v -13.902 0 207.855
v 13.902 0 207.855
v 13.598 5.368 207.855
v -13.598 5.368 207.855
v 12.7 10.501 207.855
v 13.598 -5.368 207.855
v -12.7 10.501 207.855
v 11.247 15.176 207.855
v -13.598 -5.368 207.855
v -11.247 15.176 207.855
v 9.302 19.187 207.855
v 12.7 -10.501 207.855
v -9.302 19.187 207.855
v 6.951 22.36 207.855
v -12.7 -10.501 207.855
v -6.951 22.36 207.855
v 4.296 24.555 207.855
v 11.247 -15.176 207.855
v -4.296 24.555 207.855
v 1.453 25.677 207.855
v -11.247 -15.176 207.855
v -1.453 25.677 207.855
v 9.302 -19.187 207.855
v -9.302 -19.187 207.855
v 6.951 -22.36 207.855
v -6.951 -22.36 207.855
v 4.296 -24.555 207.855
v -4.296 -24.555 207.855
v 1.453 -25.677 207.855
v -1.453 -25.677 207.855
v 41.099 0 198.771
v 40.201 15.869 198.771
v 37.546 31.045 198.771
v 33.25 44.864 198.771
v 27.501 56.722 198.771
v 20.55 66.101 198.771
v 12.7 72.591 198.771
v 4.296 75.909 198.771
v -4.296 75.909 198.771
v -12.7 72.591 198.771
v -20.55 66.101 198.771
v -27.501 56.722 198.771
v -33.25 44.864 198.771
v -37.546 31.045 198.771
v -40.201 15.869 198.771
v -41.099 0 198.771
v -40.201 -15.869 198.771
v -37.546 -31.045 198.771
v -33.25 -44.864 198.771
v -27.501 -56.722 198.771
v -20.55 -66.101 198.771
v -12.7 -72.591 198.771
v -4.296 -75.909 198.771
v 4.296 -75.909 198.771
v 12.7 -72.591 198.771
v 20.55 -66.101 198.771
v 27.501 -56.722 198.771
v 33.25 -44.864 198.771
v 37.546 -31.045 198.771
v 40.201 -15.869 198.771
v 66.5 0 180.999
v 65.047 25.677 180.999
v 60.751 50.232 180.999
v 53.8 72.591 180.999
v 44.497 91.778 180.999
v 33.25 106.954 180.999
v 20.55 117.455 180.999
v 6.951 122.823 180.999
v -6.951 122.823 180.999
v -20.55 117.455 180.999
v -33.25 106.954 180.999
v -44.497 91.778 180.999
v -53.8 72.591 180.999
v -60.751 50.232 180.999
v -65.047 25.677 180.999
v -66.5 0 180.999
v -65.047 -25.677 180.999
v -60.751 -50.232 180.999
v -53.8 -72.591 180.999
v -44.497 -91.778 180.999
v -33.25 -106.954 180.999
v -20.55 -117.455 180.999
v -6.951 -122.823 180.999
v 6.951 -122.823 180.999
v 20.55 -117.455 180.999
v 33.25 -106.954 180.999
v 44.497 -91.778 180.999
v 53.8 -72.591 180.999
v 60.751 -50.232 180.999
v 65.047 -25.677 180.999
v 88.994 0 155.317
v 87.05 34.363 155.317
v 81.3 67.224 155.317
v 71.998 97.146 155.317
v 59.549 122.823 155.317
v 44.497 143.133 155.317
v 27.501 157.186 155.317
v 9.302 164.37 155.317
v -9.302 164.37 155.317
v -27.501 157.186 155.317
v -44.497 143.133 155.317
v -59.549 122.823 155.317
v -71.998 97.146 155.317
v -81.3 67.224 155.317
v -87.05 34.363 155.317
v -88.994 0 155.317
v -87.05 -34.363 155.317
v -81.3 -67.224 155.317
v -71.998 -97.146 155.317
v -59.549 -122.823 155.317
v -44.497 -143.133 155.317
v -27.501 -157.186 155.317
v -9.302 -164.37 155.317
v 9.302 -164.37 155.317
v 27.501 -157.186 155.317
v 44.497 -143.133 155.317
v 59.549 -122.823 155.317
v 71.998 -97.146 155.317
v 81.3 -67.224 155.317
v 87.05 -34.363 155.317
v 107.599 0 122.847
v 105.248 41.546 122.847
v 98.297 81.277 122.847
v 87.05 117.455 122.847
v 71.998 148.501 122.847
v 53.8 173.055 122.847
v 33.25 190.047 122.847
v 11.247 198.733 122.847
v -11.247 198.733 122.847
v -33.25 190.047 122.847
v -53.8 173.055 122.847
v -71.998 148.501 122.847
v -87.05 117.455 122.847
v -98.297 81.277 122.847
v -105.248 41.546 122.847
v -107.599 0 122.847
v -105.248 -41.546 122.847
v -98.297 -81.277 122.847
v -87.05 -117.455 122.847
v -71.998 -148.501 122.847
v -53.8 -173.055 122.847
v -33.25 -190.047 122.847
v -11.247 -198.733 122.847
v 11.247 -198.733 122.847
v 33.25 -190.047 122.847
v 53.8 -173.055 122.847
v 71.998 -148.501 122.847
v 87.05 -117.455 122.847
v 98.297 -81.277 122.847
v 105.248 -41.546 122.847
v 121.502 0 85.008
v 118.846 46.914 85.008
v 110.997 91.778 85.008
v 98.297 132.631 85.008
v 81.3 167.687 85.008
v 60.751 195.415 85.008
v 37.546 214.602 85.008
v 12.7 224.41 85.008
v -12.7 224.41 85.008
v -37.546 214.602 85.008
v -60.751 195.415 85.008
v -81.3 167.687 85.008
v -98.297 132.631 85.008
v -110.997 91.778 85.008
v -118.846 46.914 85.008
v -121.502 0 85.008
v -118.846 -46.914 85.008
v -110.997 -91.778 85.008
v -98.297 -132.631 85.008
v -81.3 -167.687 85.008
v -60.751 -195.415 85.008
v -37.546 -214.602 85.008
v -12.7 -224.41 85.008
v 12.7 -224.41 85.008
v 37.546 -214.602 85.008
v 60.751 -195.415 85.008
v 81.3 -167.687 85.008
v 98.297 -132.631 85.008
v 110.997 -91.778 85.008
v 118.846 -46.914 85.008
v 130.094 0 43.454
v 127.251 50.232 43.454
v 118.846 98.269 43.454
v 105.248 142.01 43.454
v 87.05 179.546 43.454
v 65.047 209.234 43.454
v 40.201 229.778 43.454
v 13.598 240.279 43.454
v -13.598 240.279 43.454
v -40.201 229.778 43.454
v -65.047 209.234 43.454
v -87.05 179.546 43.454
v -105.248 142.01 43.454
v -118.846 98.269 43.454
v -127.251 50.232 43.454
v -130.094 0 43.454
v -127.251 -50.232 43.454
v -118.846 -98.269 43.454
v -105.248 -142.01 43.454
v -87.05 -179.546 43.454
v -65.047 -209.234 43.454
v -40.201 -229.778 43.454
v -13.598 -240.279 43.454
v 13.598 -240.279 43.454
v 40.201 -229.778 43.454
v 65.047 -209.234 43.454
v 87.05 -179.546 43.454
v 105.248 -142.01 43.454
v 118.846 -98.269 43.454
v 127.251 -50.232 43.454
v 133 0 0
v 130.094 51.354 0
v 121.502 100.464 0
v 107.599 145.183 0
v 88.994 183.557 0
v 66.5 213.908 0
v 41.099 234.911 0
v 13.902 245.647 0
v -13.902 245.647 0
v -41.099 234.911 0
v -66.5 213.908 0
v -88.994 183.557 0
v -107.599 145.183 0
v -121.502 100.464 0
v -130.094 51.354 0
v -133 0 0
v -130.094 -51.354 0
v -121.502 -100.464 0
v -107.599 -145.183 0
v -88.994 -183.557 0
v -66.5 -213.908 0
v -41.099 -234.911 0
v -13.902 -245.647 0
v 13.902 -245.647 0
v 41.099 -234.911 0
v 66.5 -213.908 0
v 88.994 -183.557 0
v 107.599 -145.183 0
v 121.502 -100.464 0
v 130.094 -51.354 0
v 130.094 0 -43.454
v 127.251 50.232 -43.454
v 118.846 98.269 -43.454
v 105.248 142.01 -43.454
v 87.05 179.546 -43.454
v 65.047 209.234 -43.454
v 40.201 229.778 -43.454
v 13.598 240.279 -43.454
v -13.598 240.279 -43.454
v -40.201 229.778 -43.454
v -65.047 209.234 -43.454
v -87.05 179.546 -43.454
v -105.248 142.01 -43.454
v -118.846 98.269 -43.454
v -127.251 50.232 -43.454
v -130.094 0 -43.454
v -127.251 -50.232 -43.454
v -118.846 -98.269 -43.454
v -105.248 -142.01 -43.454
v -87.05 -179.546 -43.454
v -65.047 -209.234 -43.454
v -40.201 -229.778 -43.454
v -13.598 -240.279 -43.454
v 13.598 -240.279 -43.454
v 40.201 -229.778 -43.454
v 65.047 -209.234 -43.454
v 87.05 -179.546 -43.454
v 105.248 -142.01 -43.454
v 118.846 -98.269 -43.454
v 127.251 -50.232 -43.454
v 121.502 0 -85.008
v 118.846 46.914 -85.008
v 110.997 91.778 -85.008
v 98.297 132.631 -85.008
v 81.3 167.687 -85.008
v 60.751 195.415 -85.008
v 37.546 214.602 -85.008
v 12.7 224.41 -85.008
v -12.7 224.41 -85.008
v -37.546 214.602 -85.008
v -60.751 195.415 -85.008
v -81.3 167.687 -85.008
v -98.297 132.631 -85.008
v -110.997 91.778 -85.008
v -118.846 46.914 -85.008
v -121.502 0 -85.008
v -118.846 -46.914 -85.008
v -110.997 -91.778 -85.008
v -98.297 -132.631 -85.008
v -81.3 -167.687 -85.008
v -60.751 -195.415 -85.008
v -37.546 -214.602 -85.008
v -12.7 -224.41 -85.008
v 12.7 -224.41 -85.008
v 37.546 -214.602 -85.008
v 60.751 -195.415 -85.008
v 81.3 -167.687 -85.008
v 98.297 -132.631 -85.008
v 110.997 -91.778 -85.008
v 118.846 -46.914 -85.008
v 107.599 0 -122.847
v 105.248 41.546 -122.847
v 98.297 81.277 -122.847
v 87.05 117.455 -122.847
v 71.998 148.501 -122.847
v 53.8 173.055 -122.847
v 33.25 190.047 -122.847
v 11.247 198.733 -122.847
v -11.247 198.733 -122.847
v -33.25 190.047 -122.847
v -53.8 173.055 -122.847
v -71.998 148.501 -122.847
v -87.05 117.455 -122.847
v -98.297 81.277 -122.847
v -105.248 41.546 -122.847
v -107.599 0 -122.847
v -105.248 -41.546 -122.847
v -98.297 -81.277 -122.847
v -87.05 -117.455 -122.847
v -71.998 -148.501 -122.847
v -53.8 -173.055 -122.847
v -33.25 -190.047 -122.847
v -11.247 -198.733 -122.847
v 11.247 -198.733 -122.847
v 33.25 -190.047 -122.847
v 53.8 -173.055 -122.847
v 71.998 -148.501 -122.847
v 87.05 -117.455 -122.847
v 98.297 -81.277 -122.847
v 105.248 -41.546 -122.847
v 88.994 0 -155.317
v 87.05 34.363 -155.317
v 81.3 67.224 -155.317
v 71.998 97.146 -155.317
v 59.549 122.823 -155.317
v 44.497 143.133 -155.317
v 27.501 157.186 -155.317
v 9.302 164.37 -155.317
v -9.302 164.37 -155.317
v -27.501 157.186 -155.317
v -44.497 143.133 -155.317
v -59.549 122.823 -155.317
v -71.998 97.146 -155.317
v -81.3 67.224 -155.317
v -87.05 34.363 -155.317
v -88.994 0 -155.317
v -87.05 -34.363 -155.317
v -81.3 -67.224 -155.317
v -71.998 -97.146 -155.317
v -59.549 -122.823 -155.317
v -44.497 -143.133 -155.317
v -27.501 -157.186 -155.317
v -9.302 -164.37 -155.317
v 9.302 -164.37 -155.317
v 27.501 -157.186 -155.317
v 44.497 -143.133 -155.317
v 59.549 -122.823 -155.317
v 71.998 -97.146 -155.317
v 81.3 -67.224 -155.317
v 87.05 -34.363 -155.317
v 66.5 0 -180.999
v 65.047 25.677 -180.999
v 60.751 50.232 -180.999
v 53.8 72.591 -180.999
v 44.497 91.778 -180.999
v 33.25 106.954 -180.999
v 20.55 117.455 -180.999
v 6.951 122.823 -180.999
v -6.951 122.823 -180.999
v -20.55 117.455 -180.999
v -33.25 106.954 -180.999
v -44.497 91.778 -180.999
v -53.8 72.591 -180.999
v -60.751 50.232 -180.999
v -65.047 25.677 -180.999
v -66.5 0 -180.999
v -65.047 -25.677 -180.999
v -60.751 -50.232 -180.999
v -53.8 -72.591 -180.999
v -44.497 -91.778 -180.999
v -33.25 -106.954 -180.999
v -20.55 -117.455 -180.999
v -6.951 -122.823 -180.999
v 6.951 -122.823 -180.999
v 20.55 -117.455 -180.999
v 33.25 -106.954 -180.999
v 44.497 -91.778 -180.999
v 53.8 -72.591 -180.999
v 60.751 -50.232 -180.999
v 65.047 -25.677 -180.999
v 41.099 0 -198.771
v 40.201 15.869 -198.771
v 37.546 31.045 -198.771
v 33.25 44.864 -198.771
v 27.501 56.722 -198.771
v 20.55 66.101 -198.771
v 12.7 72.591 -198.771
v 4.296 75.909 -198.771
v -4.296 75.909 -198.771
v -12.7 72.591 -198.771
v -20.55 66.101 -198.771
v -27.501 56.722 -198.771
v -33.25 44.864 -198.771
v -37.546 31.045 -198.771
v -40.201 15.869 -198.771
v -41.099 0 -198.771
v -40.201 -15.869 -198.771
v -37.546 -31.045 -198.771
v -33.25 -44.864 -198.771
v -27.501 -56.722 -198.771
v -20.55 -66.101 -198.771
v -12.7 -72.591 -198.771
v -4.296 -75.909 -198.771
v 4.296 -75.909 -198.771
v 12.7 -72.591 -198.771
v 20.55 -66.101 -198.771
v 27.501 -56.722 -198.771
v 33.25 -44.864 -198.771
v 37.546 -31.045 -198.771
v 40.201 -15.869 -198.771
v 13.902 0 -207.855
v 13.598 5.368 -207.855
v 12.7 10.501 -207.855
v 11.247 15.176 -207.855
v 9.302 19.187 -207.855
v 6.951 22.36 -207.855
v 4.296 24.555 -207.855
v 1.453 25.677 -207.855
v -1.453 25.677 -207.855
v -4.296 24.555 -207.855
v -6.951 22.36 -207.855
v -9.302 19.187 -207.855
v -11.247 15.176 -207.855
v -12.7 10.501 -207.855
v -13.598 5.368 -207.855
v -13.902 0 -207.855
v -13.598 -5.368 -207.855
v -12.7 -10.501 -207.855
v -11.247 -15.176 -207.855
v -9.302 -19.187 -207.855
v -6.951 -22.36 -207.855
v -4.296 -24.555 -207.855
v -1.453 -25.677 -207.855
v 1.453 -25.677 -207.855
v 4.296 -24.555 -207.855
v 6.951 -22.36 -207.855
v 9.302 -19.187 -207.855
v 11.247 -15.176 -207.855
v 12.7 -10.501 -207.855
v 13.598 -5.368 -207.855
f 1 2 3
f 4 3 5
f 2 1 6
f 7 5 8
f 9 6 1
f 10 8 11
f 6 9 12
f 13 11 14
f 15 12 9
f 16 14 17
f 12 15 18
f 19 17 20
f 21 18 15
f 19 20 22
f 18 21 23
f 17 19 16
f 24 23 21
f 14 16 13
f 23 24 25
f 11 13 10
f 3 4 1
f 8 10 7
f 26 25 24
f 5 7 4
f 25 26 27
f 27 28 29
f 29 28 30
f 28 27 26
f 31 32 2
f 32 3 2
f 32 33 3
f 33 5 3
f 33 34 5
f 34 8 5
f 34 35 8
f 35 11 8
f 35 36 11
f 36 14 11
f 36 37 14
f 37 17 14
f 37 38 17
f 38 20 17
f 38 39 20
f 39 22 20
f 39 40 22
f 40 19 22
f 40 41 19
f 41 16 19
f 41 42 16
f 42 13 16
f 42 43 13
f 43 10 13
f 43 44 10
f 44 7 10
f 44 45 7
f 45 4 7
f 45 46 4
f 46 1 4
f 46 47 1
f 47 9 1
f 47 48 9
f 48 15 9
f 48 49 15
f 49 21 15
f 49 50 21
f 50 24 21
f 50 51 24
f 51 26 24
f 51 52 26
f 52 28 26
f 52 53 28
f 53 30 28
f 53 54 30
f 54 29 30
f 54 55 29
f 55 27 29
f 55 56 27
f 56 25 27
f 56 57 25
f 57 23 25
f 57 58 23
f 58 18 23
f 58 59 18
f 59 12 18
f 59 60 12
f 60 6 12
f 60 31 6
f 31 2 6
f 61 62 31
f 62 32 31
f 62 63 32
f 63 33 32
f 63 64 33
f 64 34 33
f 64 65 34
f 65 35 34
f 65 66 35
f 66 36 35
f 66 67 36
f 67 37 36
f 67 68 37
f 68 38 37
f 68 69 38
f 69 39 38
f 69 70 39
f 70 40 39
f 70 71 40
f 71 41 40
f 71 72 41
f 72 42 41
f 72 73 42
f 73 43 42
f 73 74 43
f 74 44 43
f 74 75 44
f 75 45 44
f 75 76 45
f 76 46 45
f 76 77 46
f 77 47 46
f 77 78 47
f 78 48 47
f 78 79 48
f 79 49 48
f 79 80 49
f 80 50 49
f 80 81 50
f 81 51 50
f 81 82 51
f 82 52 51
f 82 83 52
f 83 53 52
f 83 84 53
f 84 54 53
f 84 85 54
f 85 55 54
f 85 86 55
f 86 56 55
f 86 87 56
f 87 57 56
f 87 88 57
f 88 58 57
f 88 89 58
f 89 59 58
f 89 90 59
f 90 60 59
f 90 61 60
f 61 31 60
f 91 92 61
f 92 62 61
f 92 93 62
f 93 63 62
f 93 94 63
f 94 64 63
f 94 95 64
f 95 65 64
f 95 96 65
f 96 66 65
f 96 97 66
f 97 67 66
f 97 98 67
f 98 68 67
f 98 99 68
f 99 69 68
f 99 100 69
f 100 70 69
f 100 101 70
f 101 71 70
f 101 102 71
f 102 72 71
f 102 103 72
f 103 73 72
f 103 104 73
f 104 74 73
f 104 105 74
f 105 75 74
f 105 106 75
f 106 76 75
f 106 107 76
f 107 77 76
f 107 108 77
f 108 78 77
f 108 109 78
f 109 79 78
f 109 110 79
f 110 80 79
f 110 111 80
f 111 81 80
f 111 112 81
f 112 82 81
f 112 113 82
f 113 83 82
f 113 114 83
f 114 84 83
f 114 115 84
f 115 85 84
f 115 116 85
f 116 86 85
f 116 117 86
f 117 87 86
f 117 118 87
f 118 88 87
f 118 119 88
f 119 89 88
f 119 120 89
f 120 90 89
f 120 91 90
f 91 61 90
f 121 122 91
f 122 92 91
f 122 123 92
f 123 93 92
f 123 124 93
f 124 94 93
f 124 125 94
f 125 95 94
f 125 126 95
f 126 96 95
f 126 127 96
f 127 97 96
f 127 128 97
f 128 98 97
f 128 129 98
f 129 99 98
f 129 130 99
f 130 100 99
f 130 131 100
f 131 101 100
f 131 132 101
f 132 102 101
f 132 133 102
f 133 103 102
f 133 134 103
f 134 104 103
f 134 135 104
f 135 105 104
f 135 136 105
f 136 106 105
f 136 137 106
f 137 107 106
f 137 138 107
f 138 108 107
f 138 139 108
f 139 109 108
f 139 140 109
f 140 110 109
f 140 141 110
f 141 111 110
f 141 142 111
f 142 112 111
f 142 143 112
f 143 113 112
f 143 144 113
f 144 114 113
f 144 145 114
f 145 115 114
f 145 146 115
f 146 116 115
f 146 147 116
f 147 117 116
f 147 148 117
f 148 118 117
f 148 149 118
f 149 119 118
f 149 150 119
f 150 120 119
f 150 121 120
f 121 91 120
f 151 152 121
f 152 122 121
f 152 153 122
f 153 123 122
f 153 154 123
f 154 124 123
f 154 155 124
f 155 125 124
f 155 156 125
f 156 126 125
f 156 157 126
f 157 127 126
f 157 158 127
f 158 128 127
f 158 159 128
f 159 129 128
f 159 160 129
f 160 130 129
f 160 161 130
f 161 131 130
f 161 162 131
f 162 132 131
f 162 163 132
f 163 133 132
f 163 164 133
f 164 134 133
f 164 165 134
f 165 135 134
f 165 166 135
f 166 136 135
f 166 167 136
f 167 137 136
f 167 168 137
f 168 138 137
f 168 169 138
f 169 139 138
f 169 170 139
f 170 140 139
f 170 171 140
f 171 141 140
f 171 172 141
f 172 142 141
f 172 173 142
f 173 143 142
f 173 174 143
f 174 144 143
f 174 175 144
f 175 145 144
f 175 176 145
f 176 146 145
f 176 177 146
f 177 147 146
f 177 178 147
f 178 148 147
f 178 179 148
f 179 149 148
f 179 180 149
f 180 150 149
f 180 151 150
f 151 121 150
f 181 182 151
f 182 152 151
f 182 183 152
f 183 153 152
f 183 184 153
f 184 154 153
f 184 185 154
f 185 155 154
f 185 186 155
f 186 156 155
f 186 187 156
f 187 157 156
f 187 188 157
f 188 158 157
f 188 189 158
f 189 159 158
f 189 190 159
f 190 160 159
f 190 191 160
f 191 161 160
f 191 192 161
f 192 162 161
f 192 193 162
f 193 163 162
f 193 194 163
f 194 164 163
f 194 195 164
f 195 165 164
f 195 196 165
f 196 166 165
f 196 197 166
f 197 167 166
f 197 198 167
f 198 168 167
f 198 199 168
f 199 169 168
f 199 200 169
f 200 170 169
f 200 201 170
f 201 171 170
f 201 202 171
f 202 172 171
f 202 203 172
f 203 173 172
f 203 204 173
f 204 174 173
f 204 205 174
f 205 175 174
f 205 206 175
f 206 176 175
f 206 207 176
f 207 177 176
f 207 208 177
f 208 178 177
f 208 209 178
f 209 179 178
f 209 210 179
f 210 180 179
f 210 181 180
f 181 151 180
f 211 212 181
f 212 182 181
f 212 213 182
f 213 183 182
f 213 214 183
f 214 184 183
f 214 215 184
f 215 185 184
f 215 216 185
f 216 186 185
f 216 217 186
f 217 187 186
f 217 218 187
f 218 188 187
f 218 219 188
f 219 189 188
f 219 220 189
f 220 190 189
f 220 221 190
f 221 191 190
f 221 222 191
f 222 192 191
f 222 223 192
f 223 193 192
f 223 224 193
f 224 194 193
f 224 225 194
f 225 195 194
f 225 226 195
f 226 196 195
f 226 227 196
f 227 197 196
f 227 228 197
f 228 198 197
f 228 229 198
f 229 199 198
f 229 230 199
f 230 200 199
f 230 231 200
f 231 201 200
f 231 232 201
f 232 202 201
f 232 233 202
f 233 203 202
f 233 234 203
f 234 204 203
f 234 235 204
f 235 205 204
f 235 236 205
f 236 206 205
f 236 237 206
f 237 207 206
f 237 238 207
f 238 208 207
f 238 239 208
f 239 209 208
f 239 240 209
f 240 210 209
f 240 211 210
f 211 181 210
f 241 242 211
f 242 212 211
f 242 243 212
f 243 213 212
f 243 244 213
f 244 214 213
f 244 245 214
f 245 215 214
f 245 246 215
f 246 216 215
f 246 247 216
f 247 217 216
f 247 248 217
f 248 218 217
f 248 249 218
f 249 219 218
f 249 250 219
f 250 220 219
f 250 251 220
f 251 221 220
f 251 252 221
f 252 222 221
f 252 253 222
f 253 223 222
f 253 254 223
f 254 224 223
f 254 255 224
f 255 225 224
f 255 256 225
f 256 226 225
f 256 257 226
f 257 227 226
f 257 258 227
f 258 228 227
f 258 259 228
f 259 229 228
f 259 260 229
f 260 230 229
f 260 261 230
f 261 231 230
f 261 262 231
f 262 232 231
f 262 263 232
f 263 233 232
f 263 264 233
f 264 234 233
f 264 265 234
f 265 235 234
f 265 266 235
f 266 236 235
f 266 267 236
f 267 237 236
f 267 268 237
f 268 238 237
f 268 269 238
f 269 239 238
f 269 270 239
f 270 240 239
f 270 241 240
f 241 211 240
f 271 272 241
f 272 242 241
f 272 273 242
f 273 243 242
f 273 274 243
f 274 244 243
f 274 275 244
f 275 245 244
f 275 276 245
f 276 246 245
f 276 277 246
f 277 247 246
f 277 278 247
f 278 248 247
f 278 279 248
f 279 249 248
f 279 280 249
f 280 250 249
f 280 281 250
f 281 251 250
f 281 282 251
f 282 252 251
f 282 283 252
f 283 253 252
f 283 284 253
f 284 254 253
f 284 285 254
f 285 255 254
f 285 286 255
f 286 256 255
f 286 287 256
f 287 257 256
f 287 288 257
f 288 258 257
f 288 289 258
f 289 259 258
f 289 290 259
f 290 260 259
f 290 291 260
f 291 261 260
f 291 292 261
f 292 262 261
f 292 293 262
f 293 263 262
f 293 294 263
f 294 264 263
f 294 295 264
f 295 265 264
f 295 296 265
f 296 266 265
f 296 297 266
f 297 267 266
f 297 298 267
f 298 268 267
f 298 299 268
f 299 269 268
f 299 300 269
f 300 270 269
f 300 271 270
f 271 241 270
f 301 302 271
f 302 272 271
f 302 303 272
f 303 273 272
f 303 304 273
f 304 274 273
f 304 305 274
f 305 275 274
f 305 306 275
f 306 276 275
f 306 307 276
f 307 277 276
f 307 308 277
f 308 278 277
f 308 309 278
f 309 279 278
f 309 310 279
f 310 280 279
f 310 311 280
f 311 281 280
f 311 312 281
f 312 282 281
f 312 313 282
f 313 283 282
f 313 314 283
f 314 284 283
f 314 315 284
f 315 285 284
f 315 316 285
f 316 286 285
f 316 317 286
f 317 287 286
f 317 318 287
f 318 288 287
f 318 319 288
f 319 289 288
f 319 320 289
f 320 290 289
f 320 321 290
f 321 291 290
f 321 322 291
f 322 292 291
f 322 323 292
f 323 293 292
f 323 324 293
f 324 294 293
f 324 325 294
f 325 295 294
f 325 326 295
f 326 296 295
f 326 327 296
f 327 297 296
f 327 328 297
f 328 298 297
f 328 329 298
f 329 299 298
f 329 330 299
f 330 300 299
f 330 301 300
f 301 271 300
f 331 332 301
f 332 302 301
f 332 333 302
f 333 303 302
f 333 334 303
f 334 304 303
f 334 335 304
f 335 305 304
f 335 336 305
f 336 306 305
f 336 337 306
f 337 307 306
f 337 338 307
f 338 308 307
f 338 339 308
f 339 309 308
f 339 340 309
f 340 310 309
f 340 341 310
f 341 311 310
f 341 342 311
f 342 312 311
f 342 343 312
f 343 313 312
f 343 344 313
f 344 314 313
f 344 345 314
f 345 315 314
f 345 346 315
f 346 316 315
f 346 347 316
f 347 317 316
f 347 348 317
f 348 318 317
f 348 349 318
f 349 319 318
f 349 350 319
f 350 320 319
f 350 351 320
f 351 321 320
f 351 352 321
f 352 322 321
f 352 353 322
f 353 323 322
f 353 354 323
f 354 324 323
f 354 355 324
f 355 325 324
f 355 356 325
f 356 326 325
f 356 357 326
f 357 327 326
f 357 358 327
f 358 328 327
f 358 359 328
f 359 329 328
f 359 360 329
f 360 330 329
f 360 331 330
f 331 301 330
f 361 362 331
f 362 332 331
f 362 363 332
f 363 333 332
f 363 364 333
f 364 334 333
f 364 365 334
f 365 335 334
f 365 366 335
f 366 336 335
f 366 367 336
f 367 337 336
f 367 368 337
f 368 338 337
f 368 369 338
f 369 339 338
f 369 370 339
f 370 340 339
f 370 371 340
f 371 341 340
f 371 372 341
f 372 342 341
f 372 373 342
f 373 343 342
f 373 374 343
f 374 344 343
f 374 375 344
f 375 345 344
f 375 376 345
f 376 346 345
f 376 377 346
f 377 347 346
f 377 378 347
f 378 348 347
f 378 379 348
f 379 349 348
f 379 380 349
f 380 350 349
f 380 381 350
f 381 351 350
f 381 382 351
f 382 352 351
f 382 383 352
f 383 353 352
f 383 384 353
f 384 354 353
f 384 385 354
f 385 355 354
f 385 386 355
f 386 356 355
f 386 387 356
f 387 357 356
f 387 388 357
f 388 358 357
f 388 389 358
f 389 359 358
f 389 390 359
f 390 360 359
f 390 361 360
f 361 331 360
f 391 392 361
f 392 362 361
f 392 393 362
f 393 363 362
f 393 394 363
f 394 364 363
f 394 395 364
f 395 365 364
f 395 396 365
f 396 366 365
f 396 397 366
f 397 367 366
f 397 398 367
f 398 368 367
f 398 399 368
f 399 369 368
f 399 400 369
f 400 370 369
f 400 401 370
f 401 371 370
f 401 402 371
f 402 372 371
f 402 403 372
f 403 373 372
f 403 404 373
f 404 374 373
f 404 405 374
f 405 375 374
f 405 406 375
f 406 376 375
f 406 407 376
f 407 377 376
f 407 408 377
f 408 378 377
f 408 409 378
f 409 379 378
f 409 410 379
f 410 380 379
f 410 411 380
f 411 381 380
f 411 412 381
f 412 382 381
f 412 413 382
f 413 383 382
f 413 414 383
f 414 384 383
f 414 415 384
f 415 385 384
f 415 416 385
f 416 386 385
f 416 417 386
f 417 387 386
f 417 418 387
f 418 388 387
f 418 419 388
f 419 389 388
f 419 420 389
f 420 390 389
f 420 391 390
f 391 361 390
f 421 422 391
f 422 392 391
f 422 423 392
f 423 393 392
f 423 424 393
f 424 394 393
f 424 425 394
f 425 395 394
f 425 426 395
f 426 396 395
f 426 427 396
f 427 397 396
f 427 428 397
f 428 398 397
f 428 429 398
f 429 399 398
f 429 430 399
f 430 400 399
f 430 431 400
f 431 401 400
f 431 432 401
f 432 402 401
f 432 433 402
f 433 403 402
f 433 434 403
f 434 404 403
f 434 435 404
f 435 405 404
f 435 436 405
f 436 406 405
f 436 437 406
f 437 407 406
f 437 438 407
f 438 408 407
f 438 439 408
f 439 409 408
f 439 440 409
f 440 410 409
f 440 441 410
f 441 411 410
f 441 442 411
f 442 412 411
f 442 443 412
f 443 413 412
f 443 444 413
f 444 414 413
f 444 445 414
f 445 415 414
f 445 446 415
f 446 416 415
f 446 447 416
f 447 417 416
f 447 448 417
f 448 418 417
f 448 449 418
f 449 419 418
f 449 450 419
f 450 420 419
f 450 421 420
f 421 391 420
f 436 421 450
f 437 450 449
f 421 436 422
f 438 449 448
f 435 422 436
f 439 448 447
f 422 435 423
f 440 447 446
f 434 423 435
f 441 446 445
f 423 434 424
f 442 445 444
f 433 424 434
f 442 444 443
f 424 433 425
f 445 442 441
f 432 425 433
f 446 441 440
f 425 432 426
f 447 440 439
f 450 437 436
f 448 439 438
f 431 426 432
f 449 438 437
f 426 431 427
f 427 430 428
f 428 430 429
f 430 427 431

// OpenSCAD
// Generated by SolidPython 1.0.1 on 2020-07-29 00:46:47


scale(v = [7, 13, 11]) {
	sphere(r = 19);
}
/***********************************************
*********      SolidPython code:      **********
************************************************
 
# import packages: SolidPython
from solid import *
from solid.utils import *
from itertools import chain, combinations, permutations


class Resize:

    def __init__(self, scad_file):
        self.scad_file = scad_file
        #self.scad_file = import_scad(scad_file)
        # cone/cylinder param:
        self.r1 = 0
        self.r2 = 0
        self.h = 0
        # rectangular prism param:
        self.w = 0
        self.l = 0
        # ellipse param:
        self.r = 0

    # import OpenScad code (file name corresponds to shape)


    # classify shape + parameters
    def assign(self, param1, param2, param3):
        if self.scad_file == 'cone.scad':
            self.r1 = param1
            self.r2 = param2
            self.h = param3
        elif self.scad_file == 'cylinder.scad':
            self.r1 = param1
            self.r2 = param2
            self.h = param3
        elif self.scad_file == 'rectangularPrism.scad':
            self.h = param1
            self.l = param2
            self.w = param3
        else:
            self.r = param1
            self.h = param2

    # resize parameters
    def iterate(self):
        x = range(3, 20, 2)
        i = 1
        if self.scad_file == 'cone.scad':
            tempList = list(permutations(x, 2))
            for temp in tempList:
                param1 = temp[0]
                param2 = temp[1]
                filepath = 'produced_scad_files/' + 'cone' + str(param1) + '_' + str(param2) + '_' + '.scad'
                scad_render_to_file(cylinder(h=param1, r1=param2, r2=0), filepath)

        elif self.scad_file == 'cylinder.scad':
            tempList = list(permutations(x, 3))
            for temp in tempList:
                param1 = temp[0]
                param2 = temp[1]
                filepath = 'produced_scad_files/' + 'cylinder' + str(param1) + '_' + str(param2) + '_' + '.scad'
                scad_render_to_file(cylinder(h=param1, r1=param2, r2=param2), filepath)

        elif self.scad_file == 'rectangularPrism.scad':
            tempList = list(permutations(x, 3))
            for temp in tempList:
                param1 = temp[0]
                param2 = temp[1]
                param3 = temp[2]
                filepath = 'produced_scad_files/' + 'rectangularPrism' + str(param1) + '_' + str(param2) + '_' + str(
                    param3) + '.scad'
                scad_render_to_file(cube(size=(param1, param2, param3)), filepath)

        elif self.scad_file == 'ellipse.scad':
            tempList = list(permutations(x, 4))
            for temp in tempList:
                param1 = temp[0]
                param2 = temp[1]
                param3 = temp[2]
                param4 = temp[3]
                filepath = 'produced_scad_files/' + 'ellipse' + str(param1) + '_' + str(param2) + '_' + str(param3) + '_' + str(param4) + '.scad'
                scad_render_to_file(scale([param1, param2, param3])(sphere(r=param4)), filepath)

    def render_to_scadfile(self):
        scad_render_to_file(scad, 'example.scad') 
 
************************************************/
